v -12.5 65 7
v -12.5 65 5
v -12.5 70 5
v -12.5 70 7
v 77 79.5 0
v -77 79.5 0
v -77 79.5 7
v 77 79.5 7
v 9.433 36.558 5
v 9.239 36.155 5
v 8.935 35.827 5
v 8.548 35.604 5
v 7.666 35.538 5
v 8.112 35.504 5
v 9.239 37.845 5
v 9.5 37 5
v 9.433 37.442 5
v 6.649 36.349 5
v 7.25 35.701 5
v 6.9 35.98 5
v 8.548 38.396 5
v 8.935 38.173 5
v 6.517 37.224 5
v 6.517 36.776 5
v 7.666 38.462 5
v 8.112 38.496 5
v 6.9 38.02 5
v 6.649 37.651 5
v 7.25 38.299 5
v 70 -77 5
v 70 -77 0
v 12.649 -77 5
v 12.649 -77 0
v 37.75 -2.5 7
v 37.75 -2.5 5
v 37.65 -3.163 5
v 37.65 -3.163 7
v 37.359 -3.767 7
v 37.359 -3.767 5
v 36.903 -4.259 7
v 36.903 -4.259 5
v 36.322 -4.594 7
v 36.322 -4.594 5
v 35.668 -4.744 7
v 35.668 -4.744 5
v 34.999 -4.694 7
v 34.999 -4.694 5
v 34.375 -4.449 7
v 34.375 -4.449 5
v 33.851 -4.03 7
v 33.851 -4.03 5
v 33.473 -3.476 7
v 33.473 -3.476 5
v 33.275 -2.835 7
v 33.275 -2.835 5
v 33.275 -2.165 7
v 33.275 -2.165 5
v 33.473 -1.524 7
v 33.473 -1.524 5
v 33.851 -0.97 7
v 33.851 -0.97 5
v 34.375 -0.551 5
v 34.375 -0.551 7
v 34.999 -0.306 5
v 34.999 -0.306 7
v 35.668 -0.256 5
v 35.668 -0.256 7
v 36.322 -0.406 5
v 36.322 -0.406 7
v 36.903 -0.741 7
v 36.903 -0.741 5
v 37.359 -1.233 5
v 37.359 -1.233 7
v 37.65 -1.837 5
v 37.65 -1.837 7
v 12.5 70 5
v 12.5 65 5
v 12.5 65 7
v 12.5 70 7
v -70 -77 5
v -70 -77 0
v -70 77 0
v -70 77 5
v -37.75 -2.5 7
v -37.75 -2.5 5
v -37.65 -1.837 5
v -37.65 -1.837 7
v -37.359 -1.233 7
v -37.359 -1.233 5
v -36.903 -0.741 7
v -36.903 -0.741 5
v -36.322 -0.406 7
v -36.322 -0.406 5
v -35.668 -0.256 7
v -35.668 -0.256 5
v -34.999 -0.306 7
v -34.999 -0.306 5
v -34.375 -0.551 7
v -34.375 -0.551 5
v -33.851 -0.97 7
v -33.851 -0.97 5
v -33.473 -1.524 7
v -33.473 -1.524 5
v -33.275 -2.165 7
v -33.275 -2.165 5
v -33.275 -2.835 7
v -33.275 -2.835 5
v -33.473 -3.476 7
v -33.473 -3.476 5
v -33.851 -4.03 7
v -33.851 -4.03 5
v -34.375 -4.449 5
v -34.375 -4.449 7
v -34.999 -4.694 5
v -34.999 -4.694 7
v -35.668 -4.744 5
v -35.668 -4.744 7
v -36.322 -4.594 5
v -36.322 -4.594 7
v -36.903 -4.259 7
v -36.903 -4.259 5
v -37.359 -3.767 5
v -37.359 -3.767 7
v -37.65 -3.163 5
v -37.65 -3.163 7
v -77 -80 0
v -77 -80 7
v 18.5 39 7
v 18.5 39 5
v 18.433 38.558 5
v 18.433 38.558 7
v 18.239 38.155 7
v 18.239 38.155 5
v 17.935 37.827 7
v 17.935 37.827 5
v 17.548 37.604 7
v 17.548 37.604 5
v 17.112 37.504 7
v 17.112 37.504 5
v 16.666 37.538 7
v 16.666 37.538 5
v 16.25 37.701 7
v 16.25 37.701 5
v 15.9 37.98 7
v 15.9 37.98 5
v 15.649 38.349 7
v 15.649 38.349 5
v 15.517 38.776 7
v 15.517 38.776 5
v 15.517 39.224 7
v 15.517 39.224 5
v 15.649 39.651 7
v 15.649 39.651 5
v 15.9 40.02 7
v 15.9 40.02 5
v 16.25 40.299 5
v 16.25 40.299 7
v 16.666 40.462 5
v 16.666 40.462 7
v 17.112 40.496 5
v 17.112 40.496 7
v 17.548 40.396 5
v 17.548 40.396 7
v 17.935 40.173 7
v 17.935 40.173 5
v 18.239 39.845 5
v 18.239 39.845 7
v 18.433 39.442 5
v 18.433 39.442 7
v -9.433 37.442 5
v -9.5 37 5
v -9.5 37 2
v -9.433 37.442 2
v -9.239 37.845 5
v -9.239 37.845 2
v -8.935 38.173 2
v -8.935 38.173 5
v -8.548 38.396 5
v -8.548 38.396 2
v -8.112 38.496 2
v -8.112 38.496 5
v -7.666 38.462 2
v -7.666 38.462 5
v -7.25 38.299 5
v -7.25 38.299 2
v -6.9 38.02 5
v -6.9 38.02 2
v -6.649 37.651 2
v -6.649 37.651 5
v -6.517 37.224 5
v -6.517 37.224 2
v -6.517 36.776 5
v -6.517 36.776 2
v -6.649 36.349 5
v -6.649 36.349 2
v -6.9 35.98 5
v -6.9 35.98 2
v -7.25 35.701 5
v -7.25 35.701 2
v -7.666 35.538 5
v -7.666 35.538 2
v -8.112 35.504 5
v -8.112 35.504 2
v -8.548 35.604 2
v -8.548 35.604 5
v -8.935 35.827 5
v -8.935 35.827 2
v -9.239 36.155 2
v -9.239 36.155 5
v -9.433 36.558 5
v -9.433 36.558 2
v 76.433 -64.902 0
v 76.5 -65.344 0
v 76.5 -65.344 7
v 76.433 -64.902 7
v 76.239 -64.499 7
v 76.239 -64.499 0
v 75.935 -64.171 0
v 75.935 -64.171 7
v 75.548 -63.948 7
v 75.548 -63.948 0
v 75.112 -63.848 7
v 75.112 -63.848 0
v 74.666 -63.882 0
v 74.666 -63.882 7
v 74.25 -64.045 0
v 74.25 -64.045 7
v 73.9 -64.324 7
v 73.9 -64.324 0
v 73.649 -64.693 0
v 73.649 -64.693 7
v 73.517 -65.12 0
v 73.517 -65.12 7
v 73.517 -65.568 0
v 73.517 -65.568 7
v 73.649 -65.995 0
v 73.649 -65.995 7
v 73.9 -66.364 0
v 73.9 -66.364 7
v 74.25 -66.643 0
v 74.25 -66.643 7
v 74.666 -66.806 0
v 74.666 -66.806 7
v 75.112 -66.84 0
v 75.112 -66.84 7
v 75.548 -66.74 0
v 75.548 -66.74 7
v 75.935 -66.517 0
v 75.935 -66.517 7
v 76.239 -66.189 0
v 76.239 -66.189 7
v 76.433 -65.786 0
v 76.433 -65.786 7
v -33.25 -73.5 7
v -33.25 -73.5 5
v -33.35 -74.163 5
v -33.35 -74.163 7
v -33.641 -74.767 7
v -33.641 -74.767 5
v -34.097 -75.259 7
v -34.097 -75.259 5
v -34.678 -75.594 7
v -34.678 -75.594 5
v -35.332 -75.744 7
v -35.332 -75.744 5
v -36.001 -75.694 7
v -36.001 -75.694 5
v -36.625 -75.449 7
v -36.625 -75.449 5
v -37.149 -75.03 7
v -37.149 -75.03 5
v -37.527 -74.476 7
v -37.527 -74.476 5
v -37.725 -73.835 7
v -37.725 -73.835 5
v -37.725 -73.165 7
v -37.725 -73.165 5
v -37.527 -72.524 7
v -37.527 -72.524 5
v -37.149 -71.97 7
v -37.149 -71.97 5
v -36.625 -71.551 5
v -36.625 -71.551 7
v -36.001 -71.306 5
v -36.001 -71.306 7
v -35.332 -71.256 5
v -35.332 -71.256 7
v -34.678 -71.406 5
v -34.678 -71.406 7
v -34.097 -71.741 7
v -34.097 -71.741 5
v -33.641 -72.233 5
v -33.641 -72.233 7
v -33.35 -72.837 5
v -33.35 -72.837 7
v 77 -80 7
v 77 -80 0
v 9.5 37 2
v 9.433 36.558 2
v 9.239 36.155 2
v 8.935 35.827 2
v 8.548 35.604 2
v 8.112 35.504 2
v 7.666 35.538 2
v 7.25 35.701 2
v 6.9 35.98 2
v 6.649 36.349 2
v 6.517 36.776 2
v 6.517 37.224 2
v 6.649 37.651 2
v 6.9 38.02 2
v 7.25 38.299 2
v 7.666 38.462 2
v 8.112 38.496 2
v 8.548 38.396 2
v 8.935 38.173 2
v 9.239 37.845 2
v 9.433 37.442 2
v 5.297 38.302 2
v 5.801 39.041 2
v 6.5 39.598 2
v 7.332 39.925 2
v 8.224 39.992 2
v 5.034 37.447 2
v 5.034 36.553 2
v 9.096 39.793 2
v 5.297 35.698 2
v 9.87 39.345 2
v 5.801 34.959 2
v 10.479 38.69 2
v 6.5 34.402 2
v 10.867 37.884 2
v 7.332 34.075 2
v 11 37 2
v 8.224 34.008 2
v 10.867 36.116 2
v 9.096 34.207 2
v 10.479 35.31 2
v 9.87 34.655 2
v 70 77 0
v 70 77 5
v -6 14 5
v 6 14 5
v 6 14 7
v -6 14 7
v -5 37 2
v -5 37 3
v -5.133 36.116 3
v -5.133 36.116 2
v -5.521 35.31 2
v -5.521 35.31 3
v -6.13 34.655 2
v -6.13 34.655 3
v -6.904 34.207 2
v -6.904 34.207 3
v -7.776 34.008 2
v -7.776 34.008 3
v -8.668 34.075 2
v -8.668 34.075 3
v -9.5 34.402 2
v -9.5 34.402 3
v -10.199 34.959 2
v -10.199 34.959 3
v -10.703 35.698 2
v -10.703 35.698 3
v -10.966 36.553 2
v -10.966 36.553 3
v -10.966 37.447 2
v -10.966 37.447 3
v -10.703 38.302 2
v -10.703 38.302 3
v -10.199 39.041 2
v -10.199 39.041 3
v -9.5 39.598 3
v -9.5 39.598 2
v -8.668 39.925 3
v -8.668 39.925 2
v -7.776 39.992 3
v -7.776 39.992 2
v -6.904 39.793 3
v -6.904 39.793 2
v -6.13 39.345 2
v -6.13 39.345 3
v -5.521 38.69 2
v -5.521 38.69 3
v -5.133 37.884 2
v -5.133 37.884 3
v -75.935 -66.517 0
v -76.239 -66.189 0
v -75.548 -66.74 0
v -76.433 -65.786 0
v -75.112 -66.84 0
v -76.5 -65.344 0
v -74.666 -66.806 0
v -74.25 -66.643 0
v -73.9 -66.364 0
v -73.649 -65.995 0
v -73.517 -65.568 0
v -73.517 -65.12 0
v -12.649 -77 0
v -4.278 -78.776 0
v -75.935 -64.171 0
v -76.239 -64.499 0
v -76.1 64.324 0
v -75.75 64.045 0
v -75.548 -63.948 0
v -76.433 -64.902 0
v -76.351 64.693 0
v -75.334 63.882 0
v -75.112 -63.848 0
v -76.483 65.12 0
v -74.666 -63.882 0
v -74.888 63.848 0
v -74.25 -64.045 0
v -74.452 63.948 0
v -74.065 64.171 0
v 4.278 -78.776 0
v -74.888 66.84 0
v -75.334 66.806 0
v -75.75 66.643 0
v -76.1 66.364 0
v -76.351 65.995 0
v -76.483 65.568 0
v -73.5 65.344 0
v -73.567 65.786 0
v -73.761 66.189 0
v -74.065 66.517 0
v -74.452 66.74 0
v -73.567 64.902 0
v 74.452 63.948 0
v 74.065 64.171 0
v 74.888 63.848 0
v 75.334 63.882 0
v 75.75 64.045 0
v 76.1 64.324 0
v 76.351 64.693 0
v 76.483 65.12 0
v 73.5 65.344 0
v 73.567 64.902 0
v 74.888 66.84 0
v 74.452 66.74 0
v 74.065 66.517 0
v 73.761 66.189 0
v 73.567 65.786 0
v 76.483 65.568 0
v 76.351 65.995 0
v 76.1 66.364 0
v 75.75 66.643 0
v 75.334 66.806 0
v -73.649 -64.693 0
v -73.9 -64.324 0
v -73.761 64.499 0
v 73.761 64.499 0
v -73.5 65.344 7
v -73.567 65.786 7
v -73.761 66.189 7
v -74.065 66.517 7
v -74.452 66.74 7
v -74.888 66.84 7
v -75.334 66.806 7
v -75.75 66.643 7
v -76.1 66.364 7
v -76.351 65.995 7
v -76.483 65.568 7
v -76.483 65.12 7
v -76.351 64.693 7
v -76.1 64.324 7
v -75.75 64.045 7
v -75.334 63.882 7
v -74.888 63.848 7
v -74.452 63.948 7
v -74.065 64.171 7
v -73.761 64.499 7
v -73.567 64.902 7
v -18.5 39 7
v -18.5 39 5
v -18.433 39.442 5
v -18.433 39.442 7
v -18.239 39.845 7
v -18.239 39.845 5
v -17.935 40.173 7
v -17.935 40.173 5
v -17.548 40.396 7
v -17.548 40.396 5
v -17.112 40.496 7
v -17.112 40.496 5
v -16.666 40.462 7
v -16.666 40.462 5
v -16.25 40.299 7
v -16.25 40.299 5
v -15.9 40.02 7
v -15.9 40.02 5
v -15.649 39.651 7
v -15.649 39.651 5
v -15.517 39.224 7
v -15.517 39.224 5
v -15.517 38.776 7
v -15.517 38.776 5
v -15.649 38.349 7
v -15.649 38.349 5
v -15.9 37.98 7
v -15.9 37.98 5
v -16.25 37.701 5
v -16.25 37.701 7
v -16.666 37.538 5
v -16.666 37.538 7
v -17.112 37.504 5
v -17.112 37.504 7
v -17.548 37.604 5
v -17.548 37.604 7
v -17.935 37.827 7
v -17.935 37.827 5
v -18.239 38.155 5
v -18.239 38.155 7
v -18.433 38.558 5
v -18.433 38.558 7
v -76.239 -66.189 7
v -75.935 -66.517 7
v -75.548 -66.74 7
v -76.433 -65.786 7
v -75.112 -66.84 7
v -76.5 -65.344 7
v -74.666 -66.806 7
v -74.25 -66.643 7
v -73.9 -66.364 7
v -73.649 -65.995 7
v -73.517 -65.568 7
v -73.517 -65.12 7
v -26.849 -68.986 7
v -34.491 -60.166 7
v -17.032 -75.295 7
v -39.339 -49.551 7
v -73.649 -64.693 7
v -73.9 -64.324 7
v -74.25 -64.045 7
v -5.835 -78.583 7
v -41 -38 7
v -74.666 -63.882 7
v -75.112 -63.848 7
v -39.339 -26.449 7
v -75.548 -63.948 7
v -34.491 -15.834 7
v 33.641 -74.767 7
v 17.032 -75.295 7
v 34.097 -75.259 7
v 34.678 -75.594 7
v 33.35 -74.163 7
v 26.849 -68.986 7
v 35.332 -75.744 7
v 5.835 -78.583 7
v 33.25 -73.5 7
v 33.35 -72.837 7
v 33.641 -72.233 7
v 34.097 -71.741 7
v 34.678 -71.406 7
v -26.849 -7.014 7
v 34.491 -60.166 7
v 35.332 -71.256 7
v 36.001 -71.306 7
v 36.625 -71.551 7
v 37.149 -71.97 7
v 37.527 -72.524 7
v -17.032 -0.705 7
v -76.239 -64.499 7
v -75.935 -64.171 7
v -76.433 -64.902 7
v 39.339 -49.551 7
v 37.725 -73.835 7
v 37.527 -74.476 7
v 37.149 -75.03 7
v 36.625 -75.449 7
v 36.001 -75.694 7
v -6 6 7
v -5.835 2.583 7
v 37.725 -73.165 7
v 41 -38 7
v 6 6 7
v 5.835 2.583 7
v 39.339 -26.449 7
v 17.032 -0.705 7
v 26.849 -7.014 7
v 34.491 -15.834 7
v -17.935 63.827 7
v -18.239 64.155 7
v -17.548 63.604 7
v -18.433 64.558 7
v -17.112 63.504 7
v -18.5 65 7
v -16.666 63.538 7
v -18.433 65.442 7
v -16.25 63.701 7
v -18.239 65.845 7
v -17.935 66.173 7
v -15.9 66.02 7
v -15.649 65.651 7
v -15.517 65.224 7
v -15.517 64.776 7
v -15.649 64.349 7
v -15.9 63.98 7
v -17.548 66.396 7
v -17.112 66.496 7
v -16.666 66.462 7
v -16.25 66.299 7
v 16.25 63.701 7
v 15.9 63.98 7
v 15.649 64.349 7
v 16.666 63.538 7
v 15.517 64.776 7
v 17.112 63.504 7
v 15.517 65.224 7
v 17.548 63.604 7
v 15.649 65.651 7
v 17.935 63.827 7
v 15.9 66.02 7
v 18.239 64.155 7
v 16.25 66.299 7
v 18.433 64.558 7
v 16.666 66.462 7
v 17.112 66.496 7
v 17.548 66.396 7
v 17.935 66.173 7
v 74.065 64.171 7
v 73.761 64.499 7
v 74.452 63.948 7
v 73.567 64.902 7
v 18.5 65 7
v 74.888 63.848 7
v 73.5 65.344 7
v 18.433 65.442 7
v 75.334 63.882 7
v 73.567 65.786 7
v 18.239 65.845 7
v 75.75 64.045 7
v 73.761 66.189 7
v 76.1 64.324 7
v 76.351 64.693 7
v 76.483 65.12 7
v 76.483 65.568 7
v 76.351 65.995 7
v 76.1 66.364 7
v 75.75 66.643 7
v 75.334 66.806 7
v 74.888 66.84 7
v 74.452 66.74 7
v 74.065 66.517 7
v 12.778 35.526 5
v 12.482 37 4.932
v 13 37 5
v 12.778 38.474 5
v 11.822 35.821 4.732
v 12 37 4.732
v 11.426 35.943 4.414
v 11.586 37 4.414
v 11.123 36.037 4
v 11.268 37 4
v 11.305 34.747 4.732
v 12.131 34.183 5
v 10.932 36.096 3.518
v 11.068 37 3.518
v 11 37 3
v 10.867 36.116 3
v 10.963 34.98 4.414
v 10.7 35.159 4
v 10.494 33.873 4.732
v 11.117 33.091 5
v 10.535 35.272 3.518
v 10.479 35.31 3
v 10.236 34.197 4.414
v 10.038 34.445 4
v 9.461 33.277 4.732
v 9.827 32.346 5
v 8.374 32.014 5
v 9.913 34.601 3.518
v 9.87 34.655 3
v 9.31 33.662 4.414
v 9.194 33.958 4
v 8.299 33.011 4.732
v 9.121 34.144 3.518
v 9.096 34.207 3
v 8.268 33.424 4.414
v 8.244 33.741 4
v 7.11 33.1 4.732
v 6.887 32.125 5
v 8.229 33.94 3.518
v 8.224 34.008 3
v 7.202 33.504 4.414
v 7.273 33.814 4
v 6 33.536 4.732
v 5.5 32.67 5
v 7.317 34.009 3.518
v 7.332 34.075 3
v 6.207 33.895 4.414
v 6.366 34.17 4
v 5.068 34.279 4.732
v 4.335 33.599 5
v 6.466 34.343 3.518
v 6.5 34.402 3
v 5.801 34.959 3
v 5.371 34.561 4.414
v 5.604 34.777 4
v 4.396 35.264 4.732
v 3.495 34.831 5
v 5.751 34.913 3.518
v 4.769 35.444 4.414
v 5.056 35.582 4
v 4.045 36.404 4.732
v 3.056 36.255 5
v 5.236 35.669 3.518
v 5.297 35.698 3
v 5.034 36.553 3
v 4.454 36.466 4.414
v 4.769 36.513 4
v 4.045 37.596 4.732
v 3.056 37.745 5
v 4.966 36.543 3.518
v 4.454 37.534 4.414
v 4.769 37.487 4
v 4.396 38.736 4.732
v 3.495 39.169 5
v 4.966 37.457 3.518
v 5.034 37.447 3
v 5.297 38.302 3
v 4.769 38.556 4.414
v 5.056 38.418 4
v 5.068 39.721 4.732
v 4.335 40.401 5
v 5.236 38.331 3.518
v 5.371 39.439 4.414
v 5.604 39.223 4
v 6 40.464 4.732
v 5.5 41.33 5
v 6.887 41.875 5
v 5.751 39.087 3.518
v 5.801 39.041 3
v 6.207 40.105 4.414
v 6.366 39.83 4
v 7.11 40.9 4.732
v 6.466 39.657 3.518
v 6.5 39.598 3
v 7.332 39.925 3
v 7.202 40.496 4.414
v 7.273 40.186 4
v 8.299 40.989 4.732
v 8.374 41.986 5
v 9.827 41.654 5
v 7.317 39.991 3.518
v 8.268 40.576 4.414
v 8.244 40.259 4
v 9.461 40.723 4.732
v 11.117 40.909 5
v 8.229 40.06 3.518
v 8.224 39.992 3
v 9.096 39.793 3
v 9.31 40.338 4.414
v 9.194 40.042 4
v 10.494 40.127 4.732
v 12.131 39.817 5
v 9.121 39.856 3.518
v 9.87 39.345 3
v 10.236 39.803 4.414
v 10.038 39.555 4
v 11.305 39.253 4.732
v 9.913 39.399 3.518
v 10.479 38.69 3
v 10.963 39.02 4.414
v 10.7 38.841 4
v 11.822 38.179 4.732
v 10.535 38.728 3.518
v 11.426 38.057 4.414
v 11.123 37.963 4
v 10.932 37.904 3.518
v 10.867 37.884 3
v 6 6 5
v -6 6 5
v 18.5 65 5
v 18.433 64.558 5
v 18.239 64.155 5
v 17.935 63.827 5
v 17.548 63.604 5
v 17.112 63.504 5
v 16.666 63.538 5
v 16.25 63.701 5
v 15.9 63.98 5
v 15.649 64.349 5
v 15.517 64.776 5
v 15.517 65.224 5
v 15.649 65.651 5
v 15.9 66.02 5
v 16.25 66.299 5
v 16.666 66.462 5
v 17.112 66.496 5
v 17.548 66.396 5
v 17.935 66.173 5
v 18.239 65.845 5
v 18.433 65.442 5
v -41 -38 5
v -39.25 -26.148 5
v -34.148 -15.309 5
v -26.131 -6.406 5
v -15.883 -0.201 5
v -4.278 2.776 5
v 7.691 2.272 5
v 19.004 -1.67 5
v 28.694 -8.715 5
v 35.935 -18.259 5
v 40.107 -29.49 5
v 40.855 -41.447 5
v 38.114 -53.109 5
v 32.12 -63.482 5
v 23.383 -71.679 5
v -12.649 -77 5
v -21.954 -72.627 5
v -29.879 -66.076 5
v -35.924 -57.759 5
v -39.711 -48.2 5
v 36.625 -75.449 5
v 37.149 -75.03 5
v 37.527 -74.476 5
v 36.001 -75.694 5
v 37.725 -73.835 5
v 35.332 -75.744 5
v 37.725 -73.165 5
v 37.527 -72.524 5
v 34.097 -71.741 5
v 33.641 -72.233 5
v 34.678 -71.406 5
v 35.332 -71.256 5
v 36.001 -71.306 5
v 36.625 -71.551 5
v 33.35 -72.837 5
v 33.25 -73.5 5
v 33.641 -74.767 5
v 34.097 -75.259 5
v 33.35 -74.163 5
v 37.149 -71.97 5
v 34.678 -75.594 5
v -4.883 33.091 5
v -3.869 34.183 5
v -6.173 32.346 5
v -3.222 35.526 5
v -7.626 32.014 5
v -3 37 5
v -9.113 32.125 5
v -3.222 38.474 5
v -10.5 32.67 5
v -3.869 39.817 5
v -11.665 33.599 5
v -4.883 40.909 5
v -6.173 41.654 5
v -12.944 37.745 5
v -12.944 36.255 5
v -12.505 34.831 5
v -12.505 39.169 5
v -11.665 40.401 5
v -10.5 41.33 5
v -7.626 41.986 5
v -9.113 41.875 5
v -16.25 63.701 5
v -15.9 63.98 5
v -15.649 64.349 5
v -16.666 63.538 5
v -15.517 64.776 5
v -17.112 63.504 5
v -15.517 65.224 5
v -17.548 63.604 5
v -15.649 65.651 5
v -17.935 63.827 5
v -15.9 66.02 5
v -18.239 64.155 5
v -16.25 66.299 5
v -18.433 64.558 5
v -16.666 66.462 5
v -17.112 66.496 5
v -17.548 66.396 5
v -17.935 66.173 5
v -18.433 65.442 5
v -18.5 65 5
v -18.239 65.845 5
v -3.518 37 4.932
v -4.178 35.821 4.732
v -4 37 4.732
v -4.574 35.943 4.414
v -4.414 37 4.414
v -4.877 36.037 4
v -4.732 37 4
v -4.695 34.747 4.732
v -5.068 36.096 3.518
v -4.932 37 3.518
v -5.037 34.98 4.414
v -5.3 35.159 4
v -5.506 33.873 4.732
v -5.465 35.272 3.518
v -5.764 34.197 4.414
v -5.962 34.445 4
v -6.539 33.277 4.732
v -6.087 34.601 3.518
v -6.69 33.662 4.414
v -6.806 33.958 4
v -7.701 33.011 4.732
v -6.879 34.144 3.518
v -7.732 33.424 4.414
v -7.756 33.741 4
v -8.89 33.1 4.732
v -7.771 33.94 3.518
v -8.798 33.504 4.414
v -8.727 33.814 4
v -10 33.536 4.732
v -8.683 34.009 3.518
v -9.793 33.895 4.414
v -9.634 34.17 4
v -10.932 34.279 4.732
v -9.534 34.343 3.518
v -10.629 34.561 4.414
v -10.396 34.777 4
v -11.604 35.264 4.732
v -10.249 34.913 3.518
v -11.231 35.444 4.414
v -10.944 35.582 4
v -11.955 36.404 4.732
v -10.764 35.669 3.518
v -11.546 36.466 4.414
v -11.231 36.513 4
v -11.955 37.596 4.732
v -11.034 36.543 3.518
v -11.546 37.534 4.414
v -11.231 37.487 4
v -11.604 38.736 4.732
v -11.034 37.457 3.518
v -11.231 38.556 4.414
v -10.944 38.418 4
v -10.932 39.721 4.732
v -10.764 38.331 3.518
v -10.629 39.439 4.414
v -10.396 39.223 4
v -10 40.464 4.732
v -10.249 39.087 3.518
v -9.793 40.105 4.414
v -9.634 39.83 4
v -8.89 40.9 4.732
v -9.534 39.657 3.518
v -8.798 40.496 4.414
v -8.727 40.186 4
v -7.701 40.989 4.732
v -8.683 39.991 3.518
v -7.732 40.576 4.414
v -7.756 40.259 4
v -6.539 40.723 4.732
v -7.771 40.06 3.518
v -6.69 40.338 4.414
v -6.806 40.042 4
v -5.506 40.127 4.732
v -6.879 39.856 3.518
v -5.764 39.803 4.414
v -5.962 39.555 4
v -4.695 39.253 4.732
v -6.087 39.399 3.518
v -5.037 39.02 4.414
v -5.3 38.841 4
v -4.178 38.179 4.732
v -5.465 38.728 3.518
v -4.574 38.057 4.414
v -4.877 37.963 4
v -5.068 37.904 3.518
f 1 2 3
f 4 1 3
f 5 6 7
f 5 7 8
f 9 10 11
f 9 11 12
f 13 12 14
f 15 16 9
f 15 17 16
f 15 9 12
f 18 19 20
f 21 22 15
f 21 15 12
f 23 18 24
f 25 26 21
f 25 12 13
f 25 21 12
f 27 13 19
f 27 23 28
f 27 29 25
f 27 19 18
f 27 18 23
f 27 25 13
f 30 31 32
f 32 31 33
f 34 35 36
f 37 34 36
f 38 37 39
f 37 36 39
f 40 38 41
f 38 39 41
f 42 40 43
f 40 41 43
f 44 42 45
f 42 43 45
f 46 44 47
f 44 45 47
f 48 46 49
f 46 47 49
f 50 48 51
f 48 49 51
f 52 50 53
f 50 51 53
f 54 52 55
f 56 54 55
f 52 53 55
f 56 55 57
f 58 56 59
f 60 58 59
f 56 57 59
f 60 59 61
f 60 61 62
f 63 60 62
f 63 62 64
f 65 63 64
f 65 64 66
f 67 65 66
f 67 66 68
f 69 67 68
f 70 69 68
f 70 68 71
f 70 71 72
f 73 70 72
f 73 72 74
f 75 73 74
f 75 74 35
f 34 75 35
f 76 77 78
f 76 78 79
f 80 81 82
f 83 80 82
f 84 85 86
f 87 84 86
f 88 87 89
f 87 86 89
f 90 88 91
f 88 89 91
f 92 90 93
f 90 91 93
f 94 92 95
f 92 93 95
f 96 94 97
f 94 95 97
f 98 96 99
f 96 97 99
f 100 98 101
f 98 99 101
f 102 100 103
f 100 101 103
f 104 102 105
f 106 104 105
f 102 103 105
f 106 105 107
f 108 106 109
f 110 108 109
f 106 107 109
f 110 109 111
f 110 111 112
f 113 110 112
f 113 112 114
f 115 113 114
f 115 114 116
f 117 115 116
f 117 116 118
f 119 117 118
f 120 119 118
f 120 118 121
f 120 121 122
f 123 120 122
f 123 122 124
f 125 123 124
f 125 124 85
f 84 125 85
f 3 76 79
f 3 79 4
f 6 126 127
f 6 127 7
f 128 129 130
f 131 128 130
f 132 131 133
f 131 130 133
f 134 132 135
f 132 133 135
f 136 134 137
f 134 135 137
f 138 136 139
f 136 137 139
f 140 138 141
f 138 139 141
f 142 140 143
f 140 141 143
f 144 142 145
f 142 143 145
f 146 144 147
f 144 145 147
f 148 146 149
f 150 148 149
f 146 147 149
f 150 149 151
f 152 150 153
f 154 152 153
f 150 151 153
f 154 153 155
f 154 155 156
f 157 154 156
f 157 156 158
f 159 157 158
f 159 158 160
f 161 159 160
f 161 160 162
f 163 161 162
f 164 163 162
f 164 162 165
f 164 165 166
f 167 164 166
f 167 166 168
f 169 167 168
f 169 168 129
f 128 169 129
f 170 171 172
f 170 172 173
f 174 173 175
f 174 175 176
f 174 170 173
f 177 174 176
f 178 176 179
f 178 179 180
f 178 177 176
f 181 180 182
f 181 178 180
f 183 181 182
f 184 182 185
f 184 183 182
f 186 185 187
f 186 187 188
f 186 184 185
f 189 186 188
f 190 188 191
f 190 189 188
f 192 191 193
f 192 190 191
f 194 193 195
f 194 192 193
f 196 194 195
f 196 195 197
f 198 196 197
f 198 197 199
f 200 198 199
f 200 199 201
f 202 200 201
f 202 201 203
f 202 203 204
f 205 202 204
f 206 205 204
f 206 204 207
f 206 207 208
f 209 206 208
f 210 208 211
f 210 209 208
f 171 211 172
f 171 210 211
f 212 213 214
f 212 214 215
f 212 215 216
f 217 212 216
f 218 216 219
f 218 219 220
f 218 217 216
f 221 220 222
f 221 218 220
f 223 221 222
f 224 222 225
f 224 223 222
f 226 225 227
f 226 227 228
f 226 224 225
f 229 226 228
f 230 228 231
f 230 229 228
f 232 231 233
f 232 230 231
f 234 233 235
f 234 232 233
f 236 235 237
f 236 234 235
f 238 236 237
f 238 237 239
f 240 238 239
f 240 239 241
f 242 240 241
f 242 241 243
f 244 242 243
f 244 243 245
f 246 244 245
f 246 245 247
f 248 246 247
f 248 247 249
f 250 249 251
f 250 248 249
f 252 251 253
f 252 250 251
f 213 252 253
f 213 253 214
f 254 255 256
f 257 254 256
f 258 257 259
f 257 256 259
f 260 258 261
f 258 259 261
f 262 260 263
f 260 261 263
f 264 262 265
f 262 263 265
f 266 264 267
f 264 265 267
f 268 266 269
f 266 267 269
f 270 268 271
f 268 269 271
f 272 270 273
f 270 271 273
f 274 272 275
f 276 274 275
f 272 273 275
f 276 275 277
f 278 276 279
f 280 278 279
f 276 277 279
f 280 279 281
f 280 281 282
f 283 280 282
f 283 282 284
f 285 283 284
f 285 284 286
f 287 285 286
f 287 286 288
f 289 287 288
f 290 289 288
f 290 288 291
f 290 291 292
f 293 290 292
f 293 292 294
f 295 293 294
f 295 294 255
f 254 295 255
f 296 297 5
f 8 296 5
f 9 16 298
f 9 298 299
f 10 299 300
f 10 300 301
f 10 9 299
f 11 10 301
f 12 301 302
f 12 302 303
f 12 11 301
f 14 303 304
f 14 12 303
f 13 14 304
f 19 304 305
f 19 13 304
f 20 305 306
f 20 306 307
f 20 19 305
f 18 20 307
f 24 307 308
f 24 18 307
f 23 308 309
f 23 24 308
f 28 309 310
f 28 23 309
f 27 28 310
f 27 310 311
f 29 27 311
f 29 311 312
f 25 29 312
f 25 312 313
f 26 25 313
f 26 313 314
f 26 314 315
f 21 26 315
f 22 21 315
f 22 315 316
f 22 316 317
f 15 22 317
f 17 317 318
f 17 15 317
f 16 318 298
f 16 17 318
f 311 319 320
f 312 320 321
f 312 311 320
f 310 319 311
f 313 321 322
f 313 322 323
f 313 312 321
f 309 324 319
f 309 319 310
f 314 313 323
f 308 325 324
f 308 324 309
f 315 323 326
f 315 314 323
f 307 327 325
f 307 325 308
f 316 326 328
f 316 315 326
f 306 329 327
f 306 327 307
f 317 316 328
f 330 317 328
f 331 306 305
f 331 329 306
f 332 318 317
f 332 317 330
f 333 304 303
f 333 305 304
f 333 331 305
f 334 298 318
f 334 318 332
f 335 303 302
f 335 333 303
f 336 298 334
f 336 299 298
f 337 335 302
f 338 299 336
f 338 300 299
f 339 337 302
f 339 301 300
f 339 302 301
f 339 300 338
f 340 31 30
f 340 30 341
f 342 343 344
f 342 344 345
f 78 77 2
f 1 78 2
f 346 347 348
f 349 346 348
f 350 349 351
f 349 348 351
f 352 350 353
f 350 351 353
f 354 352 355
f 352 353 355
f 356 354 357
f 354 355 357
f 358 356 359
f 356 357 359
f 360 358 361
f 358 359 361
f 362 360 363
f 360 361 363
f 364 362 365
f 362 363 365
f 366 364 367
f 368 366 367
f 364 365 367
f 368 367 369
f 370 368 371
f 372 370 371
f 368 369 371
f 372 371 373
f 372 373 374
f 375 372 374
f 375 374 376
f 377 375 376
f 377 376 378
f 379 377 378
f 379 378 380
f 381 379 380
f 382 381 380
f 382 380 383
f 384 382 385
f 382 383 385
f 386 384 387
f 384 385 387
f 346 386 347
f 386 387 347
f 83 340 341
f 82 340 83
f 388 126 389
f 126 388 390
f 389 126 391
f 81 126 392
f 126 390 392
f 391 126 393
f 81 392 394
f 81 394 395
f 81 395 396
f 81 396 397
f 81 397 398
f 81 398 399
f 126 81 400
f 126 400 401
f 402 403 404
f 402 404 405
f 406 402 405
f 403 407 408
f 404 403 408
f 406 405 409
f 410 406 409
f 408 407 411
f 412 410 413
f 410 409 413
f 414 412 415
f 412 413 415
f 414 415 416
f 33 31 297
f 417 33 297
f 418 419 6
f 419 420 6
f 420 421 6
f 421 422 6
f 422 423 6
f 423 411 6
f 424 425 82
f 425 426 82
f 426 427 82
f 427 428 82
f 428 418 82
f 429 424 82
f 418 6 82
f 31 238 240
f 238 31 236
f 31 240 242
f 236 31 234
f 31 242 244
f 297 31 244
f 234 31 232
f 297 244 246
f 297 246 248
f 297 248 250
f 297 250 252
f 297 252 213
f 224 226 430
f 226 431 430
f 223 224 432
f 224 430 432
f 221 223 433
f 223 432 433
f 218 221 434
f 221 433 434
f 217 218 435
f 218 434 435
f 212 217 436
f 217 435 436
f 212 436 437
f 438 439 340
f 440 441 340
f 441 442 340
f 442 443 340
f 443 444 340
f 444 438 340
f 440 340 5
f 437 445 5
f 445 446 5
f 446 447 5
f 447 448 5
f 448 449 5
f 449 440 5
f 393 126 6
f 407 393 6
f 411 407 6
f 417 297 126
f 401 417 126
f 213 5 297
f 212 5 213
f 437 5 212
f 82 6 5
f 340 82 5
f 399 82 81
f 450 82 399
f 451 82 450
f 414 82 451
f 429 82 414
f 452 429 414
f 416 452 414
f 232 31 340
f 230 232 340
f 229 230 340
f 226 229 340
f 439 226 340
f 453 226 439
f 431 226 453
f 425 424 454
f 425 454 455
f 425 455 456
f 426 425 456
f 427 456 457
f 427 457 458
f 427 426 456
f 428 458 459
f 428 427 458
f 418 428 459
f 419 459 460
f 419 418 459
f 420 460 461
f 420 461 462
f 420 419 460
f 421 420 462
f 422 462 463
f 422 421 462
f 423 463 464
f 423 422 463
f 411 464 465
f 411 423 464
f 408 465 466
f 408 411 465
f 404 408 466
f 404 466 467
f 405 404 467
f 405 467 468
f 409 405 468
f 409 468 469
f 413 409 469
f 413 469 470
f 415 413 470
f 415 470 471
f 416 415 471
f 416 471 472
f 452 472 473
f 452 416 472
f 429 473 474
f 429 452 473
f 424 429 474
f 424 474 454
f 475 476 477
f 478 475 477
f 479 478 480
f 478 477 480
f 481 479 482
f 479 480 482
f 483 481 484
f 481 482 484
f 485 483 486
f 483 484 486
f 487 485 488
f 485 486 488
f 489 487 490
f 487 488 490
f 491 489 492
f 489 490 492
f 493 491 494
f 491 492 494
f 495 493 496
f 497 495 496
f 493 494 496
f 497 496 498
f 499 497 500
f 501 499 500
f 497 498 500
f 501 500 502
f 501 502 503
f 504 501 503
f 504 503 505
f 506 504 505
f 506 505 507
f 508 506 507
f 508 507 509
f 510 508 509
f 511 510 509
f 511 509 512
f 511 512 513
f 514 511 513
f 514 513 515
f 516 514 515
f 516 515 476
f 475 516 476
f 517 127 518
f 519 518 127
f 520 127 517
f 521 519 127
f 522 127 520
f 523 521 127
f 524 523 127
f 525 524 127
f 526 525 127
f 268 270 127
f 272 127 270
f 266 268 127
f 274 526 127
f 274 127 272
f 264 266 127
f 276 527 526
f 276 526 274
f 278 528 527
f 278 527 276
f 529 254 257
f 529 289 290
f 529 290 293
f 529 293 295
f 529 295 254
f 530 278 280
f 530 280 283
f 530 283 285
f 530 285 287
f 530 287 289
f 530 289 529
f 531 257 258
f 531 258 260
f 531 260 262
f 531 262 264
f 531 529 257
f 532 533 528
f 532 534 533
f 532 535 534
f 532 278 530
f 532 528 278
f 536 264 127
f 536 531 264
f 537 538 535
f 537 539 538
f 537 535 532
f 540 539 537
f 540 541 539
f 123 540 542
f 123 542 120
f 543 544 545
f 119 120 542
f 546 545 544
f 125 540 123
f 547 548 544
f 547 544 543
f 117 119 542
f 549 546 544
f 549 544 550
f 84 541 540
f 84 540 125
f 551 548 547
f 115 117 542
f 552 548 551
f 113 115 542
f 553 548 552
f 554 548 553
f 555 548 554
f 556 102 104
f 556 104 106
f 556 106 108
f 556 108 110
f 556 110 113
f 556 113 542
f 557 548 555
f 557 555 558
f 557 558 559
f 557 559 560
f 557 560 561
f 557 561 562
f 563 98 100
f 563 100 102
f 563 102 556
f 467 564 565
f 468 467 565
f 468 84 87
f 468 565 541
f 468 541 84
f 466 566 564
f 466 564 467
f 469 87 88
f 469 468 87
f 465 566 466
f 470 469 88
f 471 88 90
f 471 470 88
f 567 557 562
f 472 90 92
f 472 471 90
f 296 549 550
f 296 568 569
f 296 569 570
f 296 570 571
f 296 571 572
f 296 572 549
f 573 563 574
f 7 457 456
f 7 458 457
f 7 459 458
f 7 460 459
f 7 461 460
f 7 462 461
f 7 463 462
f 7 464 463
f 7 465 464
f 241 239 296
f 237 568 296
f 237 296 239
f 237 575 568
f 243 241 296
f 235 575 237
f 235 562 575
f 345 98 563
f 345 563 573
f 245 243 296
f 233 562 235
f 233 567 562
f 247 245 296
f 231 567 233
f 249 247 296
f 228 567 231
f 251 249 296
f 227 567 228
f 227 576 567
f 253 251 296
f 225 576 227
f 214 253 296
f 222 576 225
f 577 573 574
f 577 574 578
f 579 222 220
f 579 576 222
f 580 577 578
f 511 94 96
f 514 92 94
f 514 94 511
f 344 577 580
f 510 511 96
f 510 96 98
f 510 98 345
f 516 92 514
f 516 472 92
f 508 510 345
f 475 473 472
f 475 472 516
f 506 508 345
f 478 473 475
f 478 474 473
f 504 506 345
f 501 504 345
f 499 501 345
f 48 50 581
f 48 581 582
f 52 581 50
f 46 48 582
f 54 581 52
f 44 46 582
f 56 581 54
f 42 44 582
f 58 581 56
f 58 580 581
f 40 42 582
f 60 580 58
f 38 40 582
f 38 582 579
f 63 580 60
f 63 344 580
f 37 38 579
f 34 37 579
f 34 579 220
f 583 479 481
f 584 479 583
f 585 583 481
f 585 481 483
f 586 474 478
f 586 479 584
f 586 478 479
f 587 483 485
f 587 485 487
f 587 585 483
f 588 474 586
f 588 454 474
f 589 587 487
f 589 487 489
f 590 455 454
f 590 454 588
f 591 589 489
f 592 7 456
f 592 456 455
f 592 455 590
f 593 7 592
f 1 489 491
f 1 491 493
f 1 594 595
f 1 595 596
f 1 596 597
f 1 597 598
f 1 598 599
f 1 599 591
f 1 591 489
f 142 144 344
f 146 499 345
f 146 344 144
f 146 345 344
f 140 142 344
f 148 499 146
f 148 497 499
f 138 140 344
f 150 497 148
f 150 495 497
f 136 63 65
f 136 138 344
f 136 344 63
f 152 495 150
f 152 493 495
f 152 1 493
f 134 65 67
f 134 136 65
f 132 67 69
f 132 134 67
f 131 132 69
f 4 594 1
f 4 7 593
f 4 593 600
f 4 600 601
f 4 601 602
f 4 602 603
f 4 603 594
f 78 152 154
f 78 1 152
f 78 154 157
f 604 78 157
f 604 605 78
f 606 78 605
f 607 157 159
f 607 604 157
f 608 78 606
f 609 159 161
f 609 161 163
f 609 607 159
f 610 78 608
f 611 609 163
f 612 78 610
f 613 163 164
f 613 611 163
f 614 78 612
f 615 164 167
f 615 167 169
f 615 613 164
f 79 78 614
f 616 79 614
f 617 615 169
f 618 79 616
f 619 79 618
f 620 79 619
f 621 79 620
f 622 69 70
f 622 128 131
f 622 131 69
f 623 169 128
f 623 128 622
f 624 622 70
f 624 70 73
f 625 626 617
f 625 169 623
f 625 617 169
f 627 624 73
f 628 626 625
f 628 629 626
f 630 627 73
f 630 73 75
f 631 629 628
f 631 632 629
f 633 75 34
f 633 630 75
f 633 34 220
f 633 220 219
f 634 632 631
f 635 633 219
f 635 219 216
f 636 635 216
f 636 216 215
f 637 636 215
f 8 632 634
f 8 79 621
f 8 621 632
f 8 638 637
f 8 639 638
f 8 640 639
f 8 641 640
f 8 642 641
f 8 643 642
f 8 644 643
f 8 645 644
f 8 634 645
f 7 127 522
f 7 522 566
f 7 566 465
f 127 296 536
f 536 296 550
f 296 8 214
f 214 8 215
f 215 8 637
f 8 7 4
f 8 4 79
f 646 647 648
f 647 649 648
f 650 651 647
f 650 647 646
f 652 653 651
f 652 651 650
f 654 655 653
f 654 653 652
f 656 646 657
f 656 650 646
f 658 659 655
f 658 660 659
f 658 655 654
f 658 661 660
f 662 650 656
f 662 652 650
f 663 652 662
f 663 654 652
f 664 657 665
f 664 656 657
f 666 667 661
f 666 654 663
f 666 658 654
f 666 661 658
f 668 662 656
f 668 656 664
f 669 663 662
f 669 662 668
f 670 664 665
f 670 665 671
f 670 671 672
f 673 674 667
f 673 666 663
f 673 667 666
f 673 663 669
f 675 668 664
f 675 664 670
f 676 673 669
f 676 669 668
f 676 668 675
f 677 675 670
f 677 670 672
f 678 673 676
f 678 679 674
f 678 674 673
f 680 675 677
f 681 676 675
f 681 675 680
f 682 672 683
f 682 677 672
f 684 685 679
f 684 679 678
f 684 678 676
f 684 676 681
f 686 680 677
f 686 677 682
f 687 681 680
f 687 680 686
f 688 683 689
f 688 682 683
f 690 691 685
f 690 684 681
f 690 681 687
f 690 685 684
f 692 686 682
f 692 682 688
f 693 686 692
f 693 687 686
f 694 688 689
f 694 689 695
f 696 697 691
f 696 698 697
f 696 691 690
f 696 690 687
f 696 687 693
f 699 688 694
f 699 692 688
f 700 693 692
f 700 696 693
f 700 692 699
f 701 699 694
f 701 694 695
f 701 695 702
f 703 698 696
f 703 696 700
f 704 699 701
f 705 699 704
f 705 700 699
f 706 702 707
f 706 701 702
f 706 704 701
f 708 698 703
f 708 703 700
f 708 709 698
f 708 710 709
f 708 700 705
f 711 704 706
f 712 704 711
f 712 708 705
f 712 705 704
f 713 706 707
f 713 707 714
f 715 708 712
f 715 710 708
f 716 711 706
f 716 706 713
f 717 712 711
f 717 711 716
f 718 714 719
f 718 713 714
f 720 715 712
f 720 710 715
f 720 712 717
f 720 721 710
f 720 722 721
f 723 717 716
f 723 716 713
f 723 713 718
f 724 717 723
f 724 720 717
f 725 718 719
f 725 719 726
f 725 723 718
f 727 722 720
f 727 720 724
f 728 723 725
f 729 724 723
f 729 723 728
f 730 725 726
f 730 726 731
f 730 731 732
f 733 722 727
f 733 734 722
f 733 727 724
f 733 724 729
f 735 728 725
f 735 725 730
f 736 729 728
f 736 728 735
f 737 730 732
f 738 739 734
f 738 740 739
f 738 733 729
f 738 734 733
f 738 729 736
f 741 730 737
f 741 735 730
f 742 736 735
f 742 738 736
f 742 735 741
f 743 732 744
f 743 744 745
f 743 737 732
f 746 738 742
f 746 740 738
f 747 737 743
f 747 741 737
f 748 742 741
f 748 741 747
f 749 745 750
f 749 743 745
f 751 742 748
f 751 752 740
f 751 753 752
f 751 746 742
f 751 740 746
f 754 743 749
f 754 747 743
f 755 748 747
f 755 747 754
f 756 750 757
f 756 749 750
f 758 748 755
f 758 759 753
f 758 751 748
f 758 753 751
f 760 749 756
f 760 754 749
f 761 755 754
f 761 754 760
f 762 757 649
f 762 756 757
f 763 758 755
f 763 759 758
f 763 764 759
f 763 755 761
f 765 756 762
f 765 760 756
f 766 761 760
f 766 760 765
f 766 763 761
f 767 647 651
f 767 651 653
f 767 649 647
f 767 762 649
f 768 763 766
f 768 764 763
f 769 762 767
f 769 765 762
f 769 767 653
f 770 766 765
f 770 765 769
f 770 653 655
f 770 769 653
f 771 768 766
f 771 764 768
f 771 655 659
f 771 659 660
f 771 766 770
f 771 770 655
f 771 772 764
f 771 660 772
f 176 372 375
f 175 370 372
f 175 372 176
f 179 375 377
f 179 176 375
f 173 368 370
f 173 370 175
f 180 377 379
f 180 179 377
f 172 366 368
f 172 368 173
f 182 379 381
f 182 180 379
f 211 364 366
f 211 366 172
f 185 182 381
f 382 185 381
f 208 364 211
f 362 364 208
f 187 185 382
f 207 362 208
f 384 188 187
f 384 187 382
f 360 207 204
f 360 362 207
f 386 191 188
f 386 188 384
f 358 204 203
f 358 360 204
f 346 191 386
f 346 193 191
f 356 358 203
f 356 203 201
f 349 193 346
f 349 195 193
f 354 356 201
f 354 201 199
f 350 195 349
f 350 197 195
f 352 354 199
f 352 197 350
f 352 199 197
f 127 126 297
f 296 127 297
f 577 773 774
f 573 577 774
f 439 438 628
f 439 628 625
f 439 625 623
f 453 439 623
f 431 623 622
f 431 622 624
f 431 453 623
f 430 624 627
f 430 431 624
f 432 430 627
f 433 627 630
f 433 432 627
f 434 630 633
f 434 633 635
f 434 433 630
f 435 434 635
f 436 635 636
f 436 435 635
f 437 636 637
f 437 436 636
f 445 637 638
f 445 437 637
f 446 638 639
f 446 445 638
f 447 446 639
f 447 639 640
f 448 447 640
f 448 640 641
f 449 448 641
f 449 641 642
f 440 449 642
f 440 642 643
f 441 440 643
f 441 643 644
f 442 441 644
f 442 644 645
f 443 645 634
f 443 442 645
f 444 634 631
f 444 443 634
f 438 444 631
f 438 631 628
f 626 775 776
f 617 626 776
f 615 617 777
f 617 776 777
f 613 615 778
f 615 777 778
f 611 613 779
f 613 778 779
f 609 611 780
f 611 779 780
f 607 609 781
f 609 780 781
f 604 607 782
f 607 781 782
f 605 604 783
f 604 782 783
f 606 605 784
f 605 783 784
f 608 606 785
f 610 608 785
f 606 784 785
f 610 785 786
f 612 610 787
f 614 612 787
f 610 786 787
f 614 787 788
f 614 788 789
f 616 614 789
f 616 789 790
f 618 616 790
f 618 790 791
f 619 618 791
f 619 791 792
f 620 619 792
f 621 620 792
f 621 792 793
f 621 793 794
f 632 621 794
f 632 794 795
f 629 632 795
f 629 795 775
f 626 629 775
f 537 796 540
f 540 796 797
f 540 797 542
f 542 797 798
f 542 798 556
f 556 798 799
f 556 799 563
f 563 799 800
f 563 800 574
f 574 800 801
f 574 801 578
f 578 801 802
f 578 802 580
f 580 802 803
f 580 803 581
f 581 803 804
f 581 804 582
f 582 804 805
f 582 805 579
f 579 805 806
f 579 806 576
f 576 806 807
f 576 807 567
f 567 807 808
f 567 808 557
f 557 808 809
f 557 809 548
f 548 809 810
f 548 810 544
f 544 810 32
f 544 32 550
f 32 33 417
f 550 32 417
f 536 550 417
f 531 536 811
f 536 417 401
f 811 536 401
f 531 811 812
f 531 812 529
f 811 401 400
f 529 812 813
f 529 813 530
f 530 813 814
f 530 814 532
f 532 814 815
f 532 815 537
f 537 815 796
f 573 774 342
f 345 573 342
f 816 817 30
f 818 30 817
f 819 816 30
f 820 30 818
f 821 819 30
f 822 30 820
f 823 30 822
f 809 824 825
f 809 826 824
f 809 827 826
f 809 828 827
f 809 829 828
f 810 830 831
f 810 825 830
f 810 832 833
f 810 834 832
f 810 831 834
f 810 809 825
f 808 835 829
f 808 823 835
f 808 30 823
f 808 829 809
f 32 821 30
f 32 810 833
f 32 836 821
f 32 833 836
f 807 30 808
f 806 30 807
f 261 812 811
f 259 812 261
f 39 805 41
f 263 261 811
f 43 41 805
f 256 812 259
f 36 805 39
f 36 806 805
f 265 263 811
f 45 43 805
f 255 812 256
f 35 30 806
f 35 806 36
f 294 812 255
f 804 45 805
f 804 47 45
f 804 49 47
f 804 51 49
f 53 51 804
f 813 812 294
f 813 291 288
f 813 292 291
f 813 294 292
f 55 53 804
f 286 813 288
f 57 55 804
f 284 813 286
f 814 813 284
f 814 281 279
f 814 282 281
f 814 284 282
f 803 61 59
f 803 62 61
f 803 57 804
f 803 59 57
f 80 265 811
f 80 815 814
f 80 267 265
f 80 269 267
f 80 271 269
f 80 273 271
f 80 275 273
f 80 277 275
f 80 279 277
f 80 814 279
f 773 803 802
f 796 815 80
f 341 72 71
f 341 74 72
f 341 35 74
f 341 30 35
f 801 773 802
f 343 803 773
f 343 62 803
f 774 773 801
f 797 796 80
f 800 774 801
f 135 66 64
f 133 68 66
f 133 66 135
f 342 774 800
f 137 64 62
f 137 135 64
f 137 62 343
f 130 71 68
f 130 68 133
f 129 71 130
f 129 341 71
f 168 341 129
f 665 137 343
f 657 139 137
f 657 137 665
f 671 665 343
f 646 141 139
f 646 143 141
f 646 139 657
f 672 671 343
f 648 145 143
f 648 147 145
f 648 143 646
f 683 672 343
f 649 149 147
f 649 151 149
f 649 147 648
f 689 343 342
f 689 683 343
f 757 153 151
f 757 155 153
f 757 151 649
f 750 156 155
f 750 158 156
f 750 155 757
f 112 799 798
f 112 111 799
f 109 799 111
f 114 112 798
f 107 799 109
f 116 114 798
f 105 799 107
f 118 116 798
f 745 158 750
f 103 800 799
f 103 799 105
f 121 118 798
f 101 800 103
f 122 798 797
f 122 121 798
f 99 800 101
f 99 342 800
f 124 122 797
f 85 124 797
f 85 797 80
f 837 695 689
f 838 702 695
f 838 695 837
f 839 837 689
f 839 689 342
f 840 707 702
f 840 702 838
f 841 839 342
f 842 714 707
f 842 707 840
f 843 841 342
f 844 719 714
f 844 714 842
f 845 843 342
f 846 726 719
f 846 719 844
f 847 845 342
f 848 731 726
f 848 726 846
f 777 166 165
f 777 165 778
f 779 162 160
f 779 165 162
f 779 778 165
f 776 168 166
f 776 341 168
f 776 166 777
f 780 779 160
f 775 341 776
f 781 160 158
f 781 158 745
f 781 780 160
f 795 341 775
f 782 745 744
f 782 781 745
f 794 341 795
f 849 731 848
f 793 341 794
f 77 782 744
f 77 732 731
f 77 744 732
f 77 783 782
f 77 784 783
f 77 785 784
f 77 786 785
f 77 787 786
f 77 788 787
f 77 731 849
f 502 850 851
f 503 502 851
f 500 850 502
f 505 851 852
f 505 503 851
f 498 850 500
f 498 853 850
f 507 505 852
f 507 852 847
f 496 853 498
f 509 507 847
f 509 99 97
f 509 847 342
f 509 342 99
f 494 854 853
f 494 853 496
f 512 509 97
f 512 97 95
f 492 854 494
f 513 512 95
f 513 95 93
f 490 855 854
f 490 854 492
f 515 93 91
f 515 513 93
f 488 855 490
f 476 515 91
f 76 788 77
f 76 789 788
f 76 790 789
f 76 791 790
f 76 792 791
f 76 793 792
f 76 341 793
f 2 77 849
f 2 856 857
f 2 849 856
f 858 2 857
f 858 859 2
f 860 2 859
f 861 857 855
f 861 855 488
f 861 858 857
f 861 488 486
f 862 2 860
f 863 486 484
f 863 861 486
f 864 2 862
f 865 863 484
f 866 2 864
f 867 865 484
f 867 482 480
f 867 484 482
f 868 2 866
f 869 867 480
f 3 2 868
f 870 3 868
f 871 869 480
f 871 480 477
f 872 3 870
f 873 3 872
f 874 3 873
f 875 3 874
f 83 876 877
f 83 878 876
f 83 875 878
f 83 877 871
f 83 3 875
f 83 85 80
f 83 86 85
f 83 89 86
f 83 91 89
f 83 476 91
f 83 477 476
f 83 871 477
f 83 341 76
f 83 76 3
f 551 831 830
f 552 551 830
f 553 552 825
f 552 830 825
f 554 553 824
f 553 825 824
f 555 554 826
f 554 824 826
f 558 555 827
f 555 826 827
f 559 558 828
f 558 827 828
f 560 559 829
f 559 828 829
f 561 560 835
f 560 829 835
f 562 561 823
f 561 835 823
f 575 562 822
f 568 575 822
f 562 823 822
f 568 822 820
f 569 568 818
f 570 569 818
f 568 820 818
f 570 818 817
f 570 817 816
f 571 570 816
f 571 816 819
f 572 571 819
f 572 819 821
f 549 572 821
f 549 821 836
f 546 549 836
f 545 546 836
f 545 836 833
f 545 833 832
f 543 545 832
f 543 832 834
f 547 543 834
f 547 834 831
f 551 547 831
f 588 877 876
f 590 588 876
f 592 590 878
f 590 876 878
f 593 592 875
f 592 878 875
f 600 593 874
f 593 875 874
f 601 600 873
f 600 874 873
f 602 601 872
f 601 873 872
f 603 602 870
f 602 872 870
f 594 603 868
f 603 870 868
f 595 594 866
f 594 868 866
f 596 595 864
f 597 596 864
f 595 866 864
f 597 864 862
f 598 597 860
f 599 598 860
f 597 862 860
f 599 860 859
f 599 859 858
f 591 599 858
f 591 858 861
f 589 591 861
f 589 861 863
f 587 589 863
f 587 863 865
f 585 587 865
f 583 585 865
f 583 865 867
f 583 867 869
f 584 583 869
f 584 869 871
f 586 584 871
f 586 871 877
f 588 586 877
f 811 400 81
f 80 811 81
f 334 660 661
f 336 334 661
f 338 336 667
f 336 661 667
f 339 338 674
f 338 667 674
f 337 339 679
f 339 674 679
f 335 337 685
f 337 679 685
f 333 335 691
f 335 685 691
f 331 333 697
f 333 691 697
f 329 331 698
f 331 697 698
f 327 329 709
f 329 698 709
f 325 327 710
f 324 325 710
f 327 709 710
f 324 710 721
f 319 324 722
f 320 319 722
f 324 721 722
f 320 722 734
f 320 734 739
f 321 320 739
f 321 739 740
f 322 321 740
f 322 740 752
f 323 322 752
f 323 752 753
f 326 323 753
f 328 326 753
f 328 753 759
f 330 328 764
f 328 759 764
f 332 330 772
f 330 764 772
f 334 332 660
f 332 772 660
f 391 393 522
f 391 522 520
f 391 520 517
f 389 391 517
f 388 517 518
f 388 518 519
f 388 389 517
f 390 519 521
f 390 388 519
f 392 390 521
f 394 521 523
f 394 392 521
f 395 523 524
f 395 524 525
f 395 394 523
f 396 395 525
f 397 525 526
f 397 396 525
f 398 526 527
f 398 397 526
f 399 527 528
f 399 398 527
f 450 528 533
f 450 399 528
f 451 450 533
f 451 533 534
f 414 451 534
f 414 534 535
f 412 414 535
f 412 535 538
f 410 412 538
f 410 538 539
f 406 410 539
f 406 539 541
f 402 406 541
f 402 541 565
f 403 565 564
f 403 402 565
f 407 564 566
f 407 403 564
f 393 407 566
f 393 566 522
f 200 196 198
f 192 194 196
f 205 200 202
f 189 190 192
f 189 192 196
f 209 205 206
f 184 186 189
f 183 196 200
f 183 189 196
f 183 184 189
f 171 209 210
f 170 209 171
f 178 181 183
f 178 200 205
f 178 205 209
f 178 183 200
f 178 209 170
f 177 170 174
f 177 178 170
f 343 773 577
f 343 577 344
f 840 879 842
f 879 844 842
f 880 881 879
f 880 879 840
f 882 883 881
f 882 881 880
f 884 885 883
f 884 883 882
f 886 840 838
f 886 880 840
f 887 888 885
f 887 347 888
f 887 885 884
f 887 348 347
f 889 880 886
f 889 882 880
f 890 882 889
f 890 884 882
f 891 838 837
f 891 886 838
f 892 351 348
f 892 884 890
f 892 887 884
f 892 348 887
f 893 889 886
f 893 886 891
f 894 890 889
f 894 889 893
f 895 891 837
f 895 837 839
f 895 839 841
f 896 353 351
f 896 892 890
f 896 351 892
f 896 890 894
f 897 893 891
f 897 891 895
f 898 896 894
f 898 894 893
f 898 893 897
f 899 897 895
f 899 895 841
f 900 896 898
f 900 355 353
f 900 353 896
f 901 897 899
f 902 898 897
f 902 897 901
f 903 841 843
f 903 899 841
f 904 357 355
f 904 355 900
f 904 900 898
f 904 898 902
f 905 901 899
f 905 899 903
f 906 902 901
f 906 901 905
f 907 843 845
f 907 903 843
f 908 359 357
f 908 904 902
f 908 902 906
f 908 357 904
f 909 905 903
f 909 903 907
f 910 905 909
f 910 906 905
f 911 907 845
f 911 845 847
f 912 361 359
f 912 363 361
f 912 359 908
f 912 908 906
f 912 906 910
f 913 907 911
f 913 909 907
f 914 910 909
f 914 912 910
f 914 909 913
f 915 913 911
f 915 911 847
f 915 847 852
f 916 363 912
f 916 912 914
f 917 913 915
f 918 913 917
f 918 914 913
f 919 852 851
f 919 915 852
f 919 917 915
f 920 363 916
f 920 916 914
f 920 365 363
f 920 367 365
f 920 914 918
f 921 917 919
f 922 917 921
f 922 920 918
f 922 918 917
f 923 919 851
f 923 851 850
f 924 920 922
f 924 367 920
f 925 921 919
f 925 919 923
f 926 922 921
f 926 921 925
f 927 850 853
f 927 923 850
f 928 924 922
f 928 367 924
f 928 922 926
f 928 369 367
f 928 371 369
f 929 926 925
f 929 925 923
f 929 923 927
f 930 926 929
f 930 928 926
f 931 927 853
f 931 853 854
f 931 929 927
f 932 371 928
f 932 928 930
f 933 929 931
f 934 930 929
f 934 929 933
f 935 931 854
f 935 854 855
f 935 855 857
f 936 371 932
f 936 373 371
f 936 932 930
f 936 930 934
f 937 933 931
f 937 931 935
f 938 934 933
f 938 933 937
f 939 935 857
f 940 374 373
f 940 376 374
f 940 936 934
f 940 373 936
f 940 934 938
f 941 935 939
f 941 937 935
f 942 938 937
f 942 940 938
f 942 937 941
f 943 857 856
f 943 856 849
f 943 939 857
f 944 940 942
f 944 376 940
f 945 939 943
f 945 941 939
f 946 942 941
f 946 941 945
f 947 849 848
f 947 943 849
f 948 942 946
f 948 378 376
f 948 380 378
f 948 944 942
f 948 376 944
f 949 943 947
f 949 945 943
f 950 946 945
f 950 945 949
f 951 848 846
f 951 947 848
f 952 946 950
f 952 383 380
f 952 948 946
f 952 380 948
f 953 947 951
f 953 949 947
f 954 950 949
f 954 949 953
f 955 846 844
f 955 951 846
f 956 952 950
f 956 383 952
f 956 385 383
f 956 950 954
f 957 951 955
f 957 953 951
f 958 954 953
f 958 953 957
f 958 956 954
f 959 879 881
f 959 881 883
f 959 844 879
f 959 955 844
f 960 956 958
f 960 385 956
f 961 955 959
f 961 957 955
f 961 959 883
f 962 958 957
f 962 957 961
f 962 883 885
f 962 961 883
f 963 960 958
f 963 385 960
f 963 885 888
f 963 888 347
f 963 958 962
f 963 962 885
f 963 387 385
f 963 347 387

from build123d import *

# Parameters (mm, degrees)
SCHIZZO1_W                   = 154
SCHIZZO1_H                   = 160
SCHIZZO1_R                   = 1.5
ESTRUSIONE_ESTRUSIONE1_DEPTH = 7
SCHIZZO2_R                   = 41
SCHIZZO2_R_2                 = 2.25
SCHIZZO2_W                   = 12
SCHIZZO2_H                   = 8
TAGLIO_ESTRUSIONE1_DEPTH     = 10
SCHIZZO3_R                   = 1.5
SCHIZZO3_W                   = 25
SCHIZZO3_H                   = 5
TAGLIO_ESTRUSIONE2_DEPTH     = 10
SCHIZZO5_W                   = 140
SCHIZZO5_H                   = 154
TAGLIO_ESTRUSIONE3_DEPTH     = 5
SCHIZZO6_R                   = 3
SCHIZZO6_R_2                 = 1.5
ESTRUSIONE_ESTRUSIONE2_DEPTH = 3
RACCORDO1_R                  = 2
SCHIZZO8_W                   = 154
SCHIZZO8_H                   = 7
TAGLIO_ESTRUSIONE4_DEPTH     = 0.5


with BuildPart() as part:
    # Schizzo1 → Estrusione-Estrusione1 (new body)
    with BuildSketch(Plane.XY):
        Rectangle(SCHIZZO1_W, SCHIZZO1_H)
        with Locations((-75, 65.34394728)):
            Circle(SCHIZZO1_R, mode=Mode.SUBTRACT)
        with Locations(Location((75, 65.34394728, 0), (0, 0, 180))):
            Circle(SCHIZZO1_R, mode=Mode.SUBTRACT)
        with Locations((75, -65.34394728)):
            Circle(SCHIZZO1_R, mode=Mode.SUBTRACT)
        with Locations(Location((-75, -65.34394728, 0), (0, 0, 180))):
            Circle(SCHIZZO1_R, mode=Mode.SUBTRACT)
    extrude(amount=ESTRUSIONE_ESTRUSIONE1_DEPTH)

    # Schizzo2 → Taglio-Estrusione1 (cut)
    with BuildSketch(Plane(origin=(0, 0, 0), x_dir=(-1, 0, 0), z_dir=(0, 0, -1))):
        with Locations((0, -38)):
            Circle(SCHIZZO2_R)
        with Locations((35.499999997, -2.500000003)):
            Circle(SCHIZZO2_R_2)
        with Locations(Location((35.499999997, -73.499999997, 0), (0, 0, 180))):
            Circle(SCHIZZO2_R_2)
        with Locations(Location((-35.499999997, -2.500000003, 0), (0, 0, 180))):
            Circle(SCHIZZO2_R_2)
        with Locations((-35.499999997, -73.499999997)):
            Circle(SCHIZZO2_R_2)
        with Locations((0, 10)):
            Rectangle(SCHIZZO2_W, SCHIZZO2_H)
    extrude(amount=-TAGLIO_ESTRUSIONE1_DEPTH, mode=Mode.SUBTRACT)

    # Schizzo3 → Taglio-Estrusione2 (cut)
    with BuildSketch(Plane(origin=(0, 0, 0), x_dir=(-1, 0, 0), z_dir=(0, 0, -1))):
        with Locations((17, 65)):
            Circle(SCHIZZO3_R)
        with Locations((17, 39)):
            Circle(SCHIZZO3_R)
        with Locations(Location((-17, 39, 0), (0, 0, 180))):
            Circle(SCHIZZO3_R)
        with Locations(Location((-17, 65, 0), (0, 0, 180))):
            Circle(SCHIZZO3_R)
        with Locations((0, 67.5)):
            Rectangle(SCHIZZO3_W, SCHIZZO3_H)
    extrude(amount=-TAGLIO_ESTRUSIONE2_DEPTH, mode=Mode.SUBTRACT)

    # Schizzo5 → Taglio-Estrusione3 (cut)
    with BuildSketch(Plane(origin=(0, 0, 0), x_dir=(-1, 0, 0), z_dir=(0, 0, -1))):
        Rectangle(SCHIZZO5_W, SCHIZZO5_H)
    extrude(amount=-TAGLIO_ESTRUSIONE3_DEPTH, mode=Mode.SUBTRACT)

    # Schizzo6 → Estrusione-Estrusione2 (add)
    # profile 1 of 2: a face of its own
    with BuildSketch(Plane(origin=(0, 0, 5), x_dir=(-1, 0, 0), z_dir=(0, 0, -1))):
        with Locations(Location((8, 37, 0), (0, 0, 180))):
            Circle(SCHIZZO6_R)
        with Locations((8, 37)):
            Circle(SCHIZZO6_R_2, mode=Mode.SUBTRACT)
    # profile 2 of 2: a face of its own
    with BuildSketch(Plane(origin=(0, 0, 5), x_dir=(-1, 0, 0), z_dir=(0, 0, -1))):
        with Locations(Location((-8, 37, 0), (0, 0, 180))):
            Circle(SCHIZZO6_R)
        with Locations(Location((-8, 37, 0), (0, 0, 180))):
            Circle(SCHIZZO6_R_2, mode=Mode.SUBTRACT)
    extrude(amount=ESTRUSIONE_ESTRUSIONE2_DEPTH)

    # Raccordo1
    raccordo1_edges = [part.edges().sort_by_distance(p)[0] for p in [
        (-11, 37, 5),
        (5, 37, 5),
    ]]
    fillet(raccordo1_edges, radius=RACCORDO1_R)

    # Schizzo8 → Taglio-Estrusione4 (cut)
    with BuildSketch(Plane(origin=(0, 80, 0), x_dir=(1, 0, 0), z_dir=(0, 1, 0))):
        with Locations((0, -3.5)):
            Rectangle(SCHIZZO8_W, SCHIZZO8_H)
    extrude(amount=-TAGLIO_ESTRUSIONE4_DEPTH, mode=Mode.SUBTRACT)


solid = part.part
